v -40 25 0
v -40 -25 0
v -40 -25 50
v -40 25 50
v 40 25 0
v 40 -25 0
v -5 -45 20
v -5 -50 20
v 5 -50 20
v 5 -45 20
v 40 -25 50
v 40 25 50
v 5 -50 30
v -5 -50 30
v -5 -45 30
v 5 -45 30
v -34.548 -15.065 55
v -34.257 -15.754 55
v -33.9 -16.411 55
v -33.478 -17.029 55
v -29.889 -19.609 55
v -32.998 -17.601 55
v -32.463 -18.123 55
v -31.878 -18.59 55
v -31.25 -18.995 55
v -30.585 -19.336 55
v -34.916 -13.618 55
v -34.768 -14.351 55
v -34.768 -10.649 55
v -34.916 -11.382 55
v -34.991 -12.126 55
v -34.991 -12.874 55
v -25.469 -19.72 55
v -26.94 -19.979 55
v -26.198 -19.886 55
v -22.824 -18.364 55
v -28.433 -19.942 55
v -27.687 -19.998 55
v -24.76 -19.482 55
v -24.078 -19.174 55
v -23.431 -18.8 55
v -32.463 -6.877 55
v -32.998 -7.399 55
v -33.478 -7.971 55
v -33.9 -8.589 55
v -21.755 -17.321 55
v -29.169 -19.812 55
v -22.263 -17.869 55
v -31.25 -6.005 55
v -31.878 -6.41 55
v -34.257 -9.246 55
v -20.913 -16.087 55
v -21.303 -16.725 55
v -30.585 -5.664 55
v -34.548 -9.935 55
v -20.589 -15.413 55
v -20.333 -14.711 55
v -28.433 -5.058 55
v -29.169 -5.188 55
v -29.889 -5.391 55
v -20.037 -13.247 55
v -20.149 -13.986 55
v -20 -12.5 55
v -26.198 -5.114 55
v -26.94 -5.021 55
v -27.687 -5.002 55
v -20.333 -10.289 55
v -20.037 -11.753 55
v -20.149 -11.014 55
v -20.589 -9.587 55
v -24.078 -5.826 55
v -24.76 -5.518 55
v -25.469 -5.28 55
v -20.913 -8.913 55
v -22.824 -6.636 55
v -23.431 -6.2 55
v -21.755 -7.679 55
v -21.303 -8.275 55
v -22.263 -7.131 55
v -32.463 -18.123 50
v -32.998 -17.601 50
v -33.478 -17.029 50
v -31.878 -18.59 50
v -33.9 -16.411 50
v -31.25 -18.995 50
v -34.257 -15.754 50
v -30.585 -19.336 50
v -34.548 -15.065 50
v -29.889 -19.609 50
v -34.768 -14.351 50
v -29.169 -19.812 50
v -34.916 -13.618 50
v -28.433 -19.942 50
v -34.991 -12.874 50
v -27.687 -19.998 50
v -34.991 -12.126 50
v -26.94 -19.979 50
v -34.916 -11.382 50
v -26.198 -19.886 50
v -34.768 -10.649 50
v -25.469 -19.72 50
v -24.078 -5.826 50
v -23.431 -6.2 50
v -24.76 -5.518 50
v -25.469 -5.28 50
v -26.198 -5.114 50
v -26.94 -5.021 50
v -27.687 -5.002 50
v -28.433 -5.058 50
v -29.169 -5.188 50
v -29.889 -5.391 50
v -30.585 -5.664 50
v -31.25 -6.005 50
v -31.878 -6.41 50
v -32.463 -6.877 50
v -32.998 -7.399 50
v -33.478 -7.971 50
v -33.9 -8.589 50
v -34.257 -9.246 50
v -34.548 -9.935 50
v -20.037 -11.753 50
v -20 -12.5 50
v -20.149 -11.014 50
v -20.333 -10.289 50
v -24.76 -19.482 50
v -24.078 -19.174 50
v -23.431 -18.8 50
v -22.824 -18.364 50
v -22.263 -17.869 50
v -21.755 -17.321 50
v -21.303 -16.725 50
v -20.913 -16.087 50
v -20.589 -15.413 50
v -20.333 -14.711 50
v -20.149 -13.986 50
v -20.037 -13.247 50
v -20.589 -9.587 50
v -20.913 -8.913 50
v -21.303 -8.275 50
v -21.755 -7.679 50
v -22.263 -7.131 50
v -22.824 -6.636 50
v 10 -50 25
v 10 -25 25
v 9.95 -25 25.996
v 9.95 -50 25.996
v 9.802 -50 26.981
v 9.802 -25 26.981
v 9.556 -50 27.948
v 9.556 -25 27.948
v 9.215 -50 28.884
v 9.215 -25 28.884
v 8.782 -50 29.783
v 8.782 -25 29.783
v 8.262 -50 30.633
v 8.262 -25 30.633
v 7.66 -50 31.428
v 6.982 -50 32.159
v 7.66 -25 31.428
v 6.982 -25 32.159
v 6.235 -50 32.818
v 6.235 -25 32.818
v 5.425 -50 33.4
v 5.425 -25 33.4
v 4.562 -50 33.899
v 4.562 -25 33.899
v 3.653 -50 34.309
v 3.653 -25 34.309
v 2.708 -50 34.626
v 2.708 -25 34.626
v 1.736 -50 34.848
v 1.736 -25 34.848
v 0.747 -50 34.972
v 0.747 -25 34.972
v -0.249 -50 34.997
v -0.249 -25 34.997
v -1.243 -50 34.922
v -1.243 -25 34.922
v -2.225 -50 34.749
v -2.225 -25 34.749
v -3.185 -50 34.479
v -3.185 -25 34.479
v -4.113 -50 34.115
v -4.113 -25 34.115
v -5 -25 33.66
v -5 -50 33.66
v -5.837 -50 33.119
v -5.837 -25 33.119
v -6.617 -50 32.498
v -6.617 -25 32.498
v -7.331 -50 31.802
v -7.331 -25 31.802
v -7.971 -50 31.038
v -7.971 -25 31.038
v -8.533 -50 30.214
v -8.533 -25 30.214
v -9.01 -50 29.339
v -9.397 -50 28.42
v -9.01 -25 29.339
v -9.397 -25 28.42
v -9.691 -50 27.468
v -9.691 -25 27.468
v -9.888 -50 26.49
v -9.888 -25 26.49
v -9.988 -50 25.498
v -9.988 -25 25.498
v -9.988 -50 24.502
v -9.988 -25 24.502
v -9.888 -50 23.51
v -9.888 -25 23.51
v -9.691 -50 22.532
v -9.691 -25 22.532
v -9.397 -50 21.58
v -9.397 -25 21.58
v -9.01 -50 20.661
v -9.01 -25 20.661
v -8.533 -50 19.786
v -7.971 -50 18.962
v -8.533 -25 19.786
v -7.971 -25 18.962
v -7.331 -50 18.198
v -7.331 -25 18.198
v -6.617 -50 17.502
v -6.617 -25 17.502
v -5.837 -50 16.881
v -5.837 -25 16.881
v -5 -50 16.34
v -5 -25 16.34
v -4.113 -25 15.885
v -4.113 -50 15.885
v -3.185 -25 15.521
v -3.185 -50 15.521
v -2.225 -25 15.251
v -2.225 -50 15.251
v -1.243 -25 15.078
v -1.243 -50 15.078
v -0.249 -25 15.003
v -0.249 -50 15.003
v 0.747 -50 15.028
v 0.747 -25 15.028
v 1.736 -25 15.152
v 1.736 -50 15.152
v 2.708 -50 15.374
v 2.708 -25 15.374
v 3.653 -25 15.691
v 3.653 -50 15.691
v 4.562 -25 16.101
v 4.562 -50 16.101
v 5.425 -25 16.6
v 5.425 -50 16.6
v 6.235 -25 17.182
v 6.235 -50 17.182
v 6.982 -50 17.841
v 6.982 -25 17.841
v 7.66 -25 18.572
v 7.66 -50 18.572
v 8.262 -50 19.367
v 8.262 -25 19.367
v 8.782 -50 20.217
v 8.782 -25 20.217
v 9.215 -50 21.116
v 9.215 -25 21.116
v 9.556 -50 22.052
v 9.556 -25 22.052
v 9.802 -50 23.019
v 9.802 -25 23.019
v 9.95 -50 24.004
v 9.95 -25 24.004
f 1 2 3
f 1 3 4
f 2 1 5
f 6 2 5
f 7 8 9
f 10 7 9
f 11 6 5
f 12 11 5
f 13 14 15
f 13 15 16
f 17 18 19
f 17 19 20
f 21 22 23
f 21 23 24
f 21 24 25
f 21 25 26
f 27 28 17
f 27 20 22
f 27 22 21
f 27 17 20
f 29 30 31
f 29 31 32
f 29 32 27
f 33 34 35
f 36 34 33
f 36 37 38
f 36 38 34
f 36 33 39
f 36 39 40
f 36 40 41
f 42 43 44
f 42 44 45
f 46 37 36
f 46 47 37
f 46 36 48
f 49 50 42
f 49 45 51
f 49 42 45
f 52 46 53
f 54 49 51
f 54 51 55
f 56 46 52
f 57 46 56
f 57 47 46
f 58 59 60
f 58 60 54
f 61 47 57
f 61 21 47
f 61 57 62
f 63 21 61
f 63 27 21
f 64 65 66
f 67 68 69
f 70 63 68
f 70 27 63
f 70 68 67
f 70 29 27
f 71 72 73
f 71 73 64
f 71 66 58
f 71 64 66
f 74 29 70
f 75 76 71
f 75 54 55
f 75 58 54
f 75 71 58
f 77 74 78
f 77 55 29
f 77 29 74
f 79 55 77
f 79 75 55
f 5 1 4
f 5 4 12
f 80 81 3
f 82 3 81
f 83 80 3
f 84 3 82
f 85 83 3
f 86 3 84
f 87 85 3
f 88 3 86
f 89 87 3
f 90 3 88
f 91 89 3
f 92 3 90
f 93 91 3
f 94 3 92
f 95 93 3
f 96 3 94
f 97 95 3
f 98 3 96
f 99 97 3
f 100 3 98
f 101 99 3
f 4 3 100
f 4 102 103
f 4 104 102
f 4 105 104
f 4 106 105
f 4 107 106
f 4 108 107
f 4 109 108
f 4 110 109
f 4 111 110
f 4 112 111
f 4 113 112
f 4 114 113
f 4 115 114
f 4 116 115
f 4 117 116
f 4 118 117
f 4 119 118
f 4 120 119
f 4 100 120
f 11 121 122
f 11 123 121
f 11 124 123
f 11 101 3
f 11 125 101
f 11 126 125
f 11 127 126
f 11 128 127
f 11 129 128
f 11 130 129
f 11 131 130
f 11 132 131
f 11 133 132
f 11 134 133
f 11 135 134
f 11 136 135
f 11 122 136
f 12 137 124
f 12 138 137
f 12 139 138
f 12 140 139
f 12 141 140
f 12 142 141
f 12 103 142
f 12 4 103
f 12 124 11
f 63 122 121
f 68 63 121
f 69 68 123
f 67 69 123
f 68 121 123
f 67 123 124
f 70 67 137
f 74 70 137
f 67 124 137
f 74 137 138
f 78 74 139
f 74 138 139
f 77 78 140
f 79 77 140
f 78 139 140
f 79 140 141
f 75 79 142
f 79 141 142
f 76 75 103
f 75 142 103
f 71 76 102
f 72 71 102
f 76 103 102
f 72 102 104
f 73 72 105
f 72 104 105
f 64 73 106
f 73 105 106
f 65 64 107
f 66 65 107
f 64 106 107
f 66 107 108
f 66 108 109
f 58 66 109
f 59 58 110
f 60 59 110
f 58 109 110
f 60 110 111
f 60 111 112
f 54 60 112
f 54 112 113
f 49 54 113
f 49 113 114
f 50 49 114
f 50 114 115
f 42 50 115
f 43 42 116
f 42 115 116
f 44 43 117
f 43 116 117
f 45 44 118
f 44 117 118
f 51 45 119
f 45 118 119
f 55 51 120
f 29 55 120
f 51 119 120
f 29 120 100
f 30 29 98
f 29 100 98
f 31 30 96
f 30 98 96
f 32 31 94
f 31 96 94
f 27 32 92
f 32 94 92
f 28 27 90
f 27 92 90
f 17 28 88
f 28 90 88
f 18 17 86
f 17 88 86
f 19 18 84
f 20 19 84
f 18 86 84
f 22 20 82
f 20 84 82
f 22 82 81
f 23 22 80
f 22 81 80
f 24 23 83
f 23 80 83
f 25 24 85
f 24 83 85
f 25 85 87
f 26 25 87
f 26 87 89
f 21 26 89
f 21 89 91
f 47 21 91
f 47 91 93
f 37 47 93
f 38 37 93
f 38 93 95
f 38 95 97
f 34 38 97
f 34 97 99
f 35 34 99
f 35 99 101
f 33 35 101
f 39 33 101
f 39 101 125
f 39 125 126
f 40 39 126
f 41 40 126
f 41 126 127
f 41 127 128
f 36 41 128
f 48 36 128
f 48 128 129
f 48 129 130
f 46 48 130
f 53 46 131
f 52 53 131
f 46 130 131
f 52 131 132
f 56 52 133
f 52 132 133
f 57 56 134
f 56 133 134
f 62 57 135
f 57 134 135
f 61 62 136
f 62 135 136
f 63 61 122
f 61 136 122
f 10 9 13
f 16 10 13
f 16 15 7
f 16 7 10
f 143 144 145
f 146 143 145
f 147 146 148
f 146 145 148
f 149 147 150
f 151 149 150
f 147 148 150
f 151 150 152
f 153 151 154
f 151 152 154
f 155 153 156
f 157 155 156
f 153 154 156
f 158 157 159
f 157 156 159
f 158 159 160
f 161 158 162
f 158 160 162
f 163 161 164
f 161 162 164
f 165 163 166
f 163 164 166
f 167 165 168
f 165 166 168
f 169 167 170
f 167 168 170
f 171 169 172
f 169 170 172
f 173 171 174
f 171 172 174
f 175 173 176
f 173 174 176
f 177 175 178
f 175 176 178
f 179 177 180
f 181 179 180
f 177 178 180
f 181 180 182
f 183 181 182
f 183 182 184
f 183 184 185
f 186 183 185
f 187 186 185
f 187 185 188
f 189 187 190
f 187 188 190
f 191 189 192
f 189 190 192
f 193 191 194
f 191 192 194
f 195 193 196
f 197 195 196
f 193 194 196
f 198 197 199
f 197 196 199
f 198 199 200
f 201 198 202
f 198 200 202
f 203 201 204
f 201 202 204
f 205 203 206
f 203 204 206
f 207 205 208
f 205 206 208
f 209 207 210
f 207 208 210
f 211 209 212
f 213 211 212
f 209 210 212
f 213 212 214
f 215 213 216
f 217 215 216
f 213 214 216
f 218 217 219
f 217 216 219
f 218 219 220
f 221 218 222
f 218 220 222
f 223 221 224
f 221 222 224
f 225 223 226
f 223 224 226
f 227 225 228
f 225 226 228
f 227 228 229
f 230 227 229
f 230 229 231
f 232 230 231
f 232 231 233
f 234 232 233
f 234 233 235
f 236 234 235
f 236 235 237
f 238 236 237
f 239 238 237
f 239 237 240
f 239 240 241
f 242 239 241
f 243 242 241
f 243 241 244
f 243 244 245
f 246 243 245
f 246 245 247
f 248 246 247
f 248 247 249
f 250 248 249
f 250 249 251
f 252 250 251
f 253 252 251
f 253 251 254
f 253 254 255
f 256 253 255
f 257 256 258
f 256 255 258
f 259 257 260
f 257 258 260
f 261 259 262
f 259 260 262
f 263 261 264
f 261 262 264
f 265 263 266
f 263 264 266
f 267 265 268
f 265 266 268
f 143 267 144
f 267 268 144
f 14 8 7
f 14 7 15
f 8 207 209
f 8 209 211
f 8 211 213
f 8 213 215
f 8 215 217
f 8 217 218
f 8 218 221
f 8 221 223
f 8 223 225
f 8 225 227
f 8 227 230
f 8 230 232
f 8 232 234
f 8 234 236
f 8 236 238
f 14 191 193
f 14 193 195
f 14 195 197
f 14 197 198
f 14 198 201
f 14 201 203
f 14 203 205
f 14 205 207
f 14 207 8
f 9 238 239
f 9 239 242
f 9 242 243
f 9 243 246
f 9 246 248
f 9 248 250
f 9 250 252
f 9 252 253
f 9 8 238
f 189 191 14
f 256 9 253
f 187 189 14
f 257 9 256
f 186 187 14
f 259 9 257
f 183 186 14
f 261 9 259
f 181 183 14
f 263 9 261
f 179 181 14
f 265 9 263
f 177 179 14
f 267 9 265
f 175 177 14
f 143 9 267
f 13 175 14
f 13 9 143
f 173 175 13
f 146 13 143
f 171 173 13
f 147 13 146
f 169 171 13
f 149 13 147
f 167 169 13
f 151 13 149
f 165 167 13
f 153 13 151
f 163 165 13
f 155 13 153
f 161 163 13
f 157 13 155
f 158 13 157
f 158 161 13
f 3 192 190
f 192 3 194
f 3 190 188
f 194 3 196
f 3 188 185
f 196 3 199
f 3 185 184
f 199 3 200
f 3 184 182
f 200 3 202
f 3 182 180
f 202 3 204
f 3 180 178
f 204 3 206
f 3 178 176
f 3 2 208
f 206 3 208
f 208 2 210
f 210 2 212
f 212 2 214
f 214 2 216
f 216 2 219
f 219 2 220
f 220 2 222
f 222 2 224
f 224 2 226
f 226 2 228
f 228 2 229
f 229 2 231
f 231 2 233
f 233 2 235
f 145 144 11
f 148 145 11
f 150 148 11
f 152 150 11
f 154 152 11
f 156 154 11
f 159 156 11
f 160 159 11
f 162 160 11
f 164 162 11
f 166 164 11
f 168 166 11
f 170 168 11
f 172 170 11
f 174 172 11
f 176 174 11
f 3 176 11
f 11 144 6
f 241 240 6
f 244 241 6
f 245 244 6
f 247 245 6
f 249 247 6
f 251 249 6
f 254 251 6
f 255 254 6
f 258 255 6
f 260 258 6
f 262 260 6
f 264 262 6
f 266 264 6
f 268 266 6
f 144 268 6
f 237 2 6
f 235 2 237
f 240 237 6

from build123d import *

# Parameters (mm, degrees)
F0_W     = 80
F0_H     = 50
F1_DEPTH = 50
F2_R     = 10
F3_DEPTH = 25
F4_W     = 10
F4_H     = 10
F5_DEPTH = 5
F6_R     = 7.5
F7_DEPTH = 5


with BuildPart() as f1:
    # F0 (on Top) → F1 (new body)
    with BuildSketch(Plane.XY):
        Rectangle(F0_W, F0_H)
    extrude(amount=F1_DEPTH)

    # F2 (on face) → F3 (join)
    with BuildSketch(Plane.XZ.offset(25)):
        with Locations((0, 25)):
            Circle(F2_R)
    extrude(amount=F3_DEPTH)

    # F4 (on face) → F5 (cut)
    with BuildSketch(Plane.XZ.offset(50)):
        with Locations((0, 25)):
            Rectangle(F4_W, F4_H)
    extrude(amount=-F5_DEPTH, mode=Mode.SUBTRACT)

    # F6 (on face) → F7 (join)
    with BuildSketch(Plane.XY.offset(50)):
        with Locations((-27.5, -12.5)):
            Circle(F6_R)
    extrude(amount=F7_DEPTH)


solid = f1.part
